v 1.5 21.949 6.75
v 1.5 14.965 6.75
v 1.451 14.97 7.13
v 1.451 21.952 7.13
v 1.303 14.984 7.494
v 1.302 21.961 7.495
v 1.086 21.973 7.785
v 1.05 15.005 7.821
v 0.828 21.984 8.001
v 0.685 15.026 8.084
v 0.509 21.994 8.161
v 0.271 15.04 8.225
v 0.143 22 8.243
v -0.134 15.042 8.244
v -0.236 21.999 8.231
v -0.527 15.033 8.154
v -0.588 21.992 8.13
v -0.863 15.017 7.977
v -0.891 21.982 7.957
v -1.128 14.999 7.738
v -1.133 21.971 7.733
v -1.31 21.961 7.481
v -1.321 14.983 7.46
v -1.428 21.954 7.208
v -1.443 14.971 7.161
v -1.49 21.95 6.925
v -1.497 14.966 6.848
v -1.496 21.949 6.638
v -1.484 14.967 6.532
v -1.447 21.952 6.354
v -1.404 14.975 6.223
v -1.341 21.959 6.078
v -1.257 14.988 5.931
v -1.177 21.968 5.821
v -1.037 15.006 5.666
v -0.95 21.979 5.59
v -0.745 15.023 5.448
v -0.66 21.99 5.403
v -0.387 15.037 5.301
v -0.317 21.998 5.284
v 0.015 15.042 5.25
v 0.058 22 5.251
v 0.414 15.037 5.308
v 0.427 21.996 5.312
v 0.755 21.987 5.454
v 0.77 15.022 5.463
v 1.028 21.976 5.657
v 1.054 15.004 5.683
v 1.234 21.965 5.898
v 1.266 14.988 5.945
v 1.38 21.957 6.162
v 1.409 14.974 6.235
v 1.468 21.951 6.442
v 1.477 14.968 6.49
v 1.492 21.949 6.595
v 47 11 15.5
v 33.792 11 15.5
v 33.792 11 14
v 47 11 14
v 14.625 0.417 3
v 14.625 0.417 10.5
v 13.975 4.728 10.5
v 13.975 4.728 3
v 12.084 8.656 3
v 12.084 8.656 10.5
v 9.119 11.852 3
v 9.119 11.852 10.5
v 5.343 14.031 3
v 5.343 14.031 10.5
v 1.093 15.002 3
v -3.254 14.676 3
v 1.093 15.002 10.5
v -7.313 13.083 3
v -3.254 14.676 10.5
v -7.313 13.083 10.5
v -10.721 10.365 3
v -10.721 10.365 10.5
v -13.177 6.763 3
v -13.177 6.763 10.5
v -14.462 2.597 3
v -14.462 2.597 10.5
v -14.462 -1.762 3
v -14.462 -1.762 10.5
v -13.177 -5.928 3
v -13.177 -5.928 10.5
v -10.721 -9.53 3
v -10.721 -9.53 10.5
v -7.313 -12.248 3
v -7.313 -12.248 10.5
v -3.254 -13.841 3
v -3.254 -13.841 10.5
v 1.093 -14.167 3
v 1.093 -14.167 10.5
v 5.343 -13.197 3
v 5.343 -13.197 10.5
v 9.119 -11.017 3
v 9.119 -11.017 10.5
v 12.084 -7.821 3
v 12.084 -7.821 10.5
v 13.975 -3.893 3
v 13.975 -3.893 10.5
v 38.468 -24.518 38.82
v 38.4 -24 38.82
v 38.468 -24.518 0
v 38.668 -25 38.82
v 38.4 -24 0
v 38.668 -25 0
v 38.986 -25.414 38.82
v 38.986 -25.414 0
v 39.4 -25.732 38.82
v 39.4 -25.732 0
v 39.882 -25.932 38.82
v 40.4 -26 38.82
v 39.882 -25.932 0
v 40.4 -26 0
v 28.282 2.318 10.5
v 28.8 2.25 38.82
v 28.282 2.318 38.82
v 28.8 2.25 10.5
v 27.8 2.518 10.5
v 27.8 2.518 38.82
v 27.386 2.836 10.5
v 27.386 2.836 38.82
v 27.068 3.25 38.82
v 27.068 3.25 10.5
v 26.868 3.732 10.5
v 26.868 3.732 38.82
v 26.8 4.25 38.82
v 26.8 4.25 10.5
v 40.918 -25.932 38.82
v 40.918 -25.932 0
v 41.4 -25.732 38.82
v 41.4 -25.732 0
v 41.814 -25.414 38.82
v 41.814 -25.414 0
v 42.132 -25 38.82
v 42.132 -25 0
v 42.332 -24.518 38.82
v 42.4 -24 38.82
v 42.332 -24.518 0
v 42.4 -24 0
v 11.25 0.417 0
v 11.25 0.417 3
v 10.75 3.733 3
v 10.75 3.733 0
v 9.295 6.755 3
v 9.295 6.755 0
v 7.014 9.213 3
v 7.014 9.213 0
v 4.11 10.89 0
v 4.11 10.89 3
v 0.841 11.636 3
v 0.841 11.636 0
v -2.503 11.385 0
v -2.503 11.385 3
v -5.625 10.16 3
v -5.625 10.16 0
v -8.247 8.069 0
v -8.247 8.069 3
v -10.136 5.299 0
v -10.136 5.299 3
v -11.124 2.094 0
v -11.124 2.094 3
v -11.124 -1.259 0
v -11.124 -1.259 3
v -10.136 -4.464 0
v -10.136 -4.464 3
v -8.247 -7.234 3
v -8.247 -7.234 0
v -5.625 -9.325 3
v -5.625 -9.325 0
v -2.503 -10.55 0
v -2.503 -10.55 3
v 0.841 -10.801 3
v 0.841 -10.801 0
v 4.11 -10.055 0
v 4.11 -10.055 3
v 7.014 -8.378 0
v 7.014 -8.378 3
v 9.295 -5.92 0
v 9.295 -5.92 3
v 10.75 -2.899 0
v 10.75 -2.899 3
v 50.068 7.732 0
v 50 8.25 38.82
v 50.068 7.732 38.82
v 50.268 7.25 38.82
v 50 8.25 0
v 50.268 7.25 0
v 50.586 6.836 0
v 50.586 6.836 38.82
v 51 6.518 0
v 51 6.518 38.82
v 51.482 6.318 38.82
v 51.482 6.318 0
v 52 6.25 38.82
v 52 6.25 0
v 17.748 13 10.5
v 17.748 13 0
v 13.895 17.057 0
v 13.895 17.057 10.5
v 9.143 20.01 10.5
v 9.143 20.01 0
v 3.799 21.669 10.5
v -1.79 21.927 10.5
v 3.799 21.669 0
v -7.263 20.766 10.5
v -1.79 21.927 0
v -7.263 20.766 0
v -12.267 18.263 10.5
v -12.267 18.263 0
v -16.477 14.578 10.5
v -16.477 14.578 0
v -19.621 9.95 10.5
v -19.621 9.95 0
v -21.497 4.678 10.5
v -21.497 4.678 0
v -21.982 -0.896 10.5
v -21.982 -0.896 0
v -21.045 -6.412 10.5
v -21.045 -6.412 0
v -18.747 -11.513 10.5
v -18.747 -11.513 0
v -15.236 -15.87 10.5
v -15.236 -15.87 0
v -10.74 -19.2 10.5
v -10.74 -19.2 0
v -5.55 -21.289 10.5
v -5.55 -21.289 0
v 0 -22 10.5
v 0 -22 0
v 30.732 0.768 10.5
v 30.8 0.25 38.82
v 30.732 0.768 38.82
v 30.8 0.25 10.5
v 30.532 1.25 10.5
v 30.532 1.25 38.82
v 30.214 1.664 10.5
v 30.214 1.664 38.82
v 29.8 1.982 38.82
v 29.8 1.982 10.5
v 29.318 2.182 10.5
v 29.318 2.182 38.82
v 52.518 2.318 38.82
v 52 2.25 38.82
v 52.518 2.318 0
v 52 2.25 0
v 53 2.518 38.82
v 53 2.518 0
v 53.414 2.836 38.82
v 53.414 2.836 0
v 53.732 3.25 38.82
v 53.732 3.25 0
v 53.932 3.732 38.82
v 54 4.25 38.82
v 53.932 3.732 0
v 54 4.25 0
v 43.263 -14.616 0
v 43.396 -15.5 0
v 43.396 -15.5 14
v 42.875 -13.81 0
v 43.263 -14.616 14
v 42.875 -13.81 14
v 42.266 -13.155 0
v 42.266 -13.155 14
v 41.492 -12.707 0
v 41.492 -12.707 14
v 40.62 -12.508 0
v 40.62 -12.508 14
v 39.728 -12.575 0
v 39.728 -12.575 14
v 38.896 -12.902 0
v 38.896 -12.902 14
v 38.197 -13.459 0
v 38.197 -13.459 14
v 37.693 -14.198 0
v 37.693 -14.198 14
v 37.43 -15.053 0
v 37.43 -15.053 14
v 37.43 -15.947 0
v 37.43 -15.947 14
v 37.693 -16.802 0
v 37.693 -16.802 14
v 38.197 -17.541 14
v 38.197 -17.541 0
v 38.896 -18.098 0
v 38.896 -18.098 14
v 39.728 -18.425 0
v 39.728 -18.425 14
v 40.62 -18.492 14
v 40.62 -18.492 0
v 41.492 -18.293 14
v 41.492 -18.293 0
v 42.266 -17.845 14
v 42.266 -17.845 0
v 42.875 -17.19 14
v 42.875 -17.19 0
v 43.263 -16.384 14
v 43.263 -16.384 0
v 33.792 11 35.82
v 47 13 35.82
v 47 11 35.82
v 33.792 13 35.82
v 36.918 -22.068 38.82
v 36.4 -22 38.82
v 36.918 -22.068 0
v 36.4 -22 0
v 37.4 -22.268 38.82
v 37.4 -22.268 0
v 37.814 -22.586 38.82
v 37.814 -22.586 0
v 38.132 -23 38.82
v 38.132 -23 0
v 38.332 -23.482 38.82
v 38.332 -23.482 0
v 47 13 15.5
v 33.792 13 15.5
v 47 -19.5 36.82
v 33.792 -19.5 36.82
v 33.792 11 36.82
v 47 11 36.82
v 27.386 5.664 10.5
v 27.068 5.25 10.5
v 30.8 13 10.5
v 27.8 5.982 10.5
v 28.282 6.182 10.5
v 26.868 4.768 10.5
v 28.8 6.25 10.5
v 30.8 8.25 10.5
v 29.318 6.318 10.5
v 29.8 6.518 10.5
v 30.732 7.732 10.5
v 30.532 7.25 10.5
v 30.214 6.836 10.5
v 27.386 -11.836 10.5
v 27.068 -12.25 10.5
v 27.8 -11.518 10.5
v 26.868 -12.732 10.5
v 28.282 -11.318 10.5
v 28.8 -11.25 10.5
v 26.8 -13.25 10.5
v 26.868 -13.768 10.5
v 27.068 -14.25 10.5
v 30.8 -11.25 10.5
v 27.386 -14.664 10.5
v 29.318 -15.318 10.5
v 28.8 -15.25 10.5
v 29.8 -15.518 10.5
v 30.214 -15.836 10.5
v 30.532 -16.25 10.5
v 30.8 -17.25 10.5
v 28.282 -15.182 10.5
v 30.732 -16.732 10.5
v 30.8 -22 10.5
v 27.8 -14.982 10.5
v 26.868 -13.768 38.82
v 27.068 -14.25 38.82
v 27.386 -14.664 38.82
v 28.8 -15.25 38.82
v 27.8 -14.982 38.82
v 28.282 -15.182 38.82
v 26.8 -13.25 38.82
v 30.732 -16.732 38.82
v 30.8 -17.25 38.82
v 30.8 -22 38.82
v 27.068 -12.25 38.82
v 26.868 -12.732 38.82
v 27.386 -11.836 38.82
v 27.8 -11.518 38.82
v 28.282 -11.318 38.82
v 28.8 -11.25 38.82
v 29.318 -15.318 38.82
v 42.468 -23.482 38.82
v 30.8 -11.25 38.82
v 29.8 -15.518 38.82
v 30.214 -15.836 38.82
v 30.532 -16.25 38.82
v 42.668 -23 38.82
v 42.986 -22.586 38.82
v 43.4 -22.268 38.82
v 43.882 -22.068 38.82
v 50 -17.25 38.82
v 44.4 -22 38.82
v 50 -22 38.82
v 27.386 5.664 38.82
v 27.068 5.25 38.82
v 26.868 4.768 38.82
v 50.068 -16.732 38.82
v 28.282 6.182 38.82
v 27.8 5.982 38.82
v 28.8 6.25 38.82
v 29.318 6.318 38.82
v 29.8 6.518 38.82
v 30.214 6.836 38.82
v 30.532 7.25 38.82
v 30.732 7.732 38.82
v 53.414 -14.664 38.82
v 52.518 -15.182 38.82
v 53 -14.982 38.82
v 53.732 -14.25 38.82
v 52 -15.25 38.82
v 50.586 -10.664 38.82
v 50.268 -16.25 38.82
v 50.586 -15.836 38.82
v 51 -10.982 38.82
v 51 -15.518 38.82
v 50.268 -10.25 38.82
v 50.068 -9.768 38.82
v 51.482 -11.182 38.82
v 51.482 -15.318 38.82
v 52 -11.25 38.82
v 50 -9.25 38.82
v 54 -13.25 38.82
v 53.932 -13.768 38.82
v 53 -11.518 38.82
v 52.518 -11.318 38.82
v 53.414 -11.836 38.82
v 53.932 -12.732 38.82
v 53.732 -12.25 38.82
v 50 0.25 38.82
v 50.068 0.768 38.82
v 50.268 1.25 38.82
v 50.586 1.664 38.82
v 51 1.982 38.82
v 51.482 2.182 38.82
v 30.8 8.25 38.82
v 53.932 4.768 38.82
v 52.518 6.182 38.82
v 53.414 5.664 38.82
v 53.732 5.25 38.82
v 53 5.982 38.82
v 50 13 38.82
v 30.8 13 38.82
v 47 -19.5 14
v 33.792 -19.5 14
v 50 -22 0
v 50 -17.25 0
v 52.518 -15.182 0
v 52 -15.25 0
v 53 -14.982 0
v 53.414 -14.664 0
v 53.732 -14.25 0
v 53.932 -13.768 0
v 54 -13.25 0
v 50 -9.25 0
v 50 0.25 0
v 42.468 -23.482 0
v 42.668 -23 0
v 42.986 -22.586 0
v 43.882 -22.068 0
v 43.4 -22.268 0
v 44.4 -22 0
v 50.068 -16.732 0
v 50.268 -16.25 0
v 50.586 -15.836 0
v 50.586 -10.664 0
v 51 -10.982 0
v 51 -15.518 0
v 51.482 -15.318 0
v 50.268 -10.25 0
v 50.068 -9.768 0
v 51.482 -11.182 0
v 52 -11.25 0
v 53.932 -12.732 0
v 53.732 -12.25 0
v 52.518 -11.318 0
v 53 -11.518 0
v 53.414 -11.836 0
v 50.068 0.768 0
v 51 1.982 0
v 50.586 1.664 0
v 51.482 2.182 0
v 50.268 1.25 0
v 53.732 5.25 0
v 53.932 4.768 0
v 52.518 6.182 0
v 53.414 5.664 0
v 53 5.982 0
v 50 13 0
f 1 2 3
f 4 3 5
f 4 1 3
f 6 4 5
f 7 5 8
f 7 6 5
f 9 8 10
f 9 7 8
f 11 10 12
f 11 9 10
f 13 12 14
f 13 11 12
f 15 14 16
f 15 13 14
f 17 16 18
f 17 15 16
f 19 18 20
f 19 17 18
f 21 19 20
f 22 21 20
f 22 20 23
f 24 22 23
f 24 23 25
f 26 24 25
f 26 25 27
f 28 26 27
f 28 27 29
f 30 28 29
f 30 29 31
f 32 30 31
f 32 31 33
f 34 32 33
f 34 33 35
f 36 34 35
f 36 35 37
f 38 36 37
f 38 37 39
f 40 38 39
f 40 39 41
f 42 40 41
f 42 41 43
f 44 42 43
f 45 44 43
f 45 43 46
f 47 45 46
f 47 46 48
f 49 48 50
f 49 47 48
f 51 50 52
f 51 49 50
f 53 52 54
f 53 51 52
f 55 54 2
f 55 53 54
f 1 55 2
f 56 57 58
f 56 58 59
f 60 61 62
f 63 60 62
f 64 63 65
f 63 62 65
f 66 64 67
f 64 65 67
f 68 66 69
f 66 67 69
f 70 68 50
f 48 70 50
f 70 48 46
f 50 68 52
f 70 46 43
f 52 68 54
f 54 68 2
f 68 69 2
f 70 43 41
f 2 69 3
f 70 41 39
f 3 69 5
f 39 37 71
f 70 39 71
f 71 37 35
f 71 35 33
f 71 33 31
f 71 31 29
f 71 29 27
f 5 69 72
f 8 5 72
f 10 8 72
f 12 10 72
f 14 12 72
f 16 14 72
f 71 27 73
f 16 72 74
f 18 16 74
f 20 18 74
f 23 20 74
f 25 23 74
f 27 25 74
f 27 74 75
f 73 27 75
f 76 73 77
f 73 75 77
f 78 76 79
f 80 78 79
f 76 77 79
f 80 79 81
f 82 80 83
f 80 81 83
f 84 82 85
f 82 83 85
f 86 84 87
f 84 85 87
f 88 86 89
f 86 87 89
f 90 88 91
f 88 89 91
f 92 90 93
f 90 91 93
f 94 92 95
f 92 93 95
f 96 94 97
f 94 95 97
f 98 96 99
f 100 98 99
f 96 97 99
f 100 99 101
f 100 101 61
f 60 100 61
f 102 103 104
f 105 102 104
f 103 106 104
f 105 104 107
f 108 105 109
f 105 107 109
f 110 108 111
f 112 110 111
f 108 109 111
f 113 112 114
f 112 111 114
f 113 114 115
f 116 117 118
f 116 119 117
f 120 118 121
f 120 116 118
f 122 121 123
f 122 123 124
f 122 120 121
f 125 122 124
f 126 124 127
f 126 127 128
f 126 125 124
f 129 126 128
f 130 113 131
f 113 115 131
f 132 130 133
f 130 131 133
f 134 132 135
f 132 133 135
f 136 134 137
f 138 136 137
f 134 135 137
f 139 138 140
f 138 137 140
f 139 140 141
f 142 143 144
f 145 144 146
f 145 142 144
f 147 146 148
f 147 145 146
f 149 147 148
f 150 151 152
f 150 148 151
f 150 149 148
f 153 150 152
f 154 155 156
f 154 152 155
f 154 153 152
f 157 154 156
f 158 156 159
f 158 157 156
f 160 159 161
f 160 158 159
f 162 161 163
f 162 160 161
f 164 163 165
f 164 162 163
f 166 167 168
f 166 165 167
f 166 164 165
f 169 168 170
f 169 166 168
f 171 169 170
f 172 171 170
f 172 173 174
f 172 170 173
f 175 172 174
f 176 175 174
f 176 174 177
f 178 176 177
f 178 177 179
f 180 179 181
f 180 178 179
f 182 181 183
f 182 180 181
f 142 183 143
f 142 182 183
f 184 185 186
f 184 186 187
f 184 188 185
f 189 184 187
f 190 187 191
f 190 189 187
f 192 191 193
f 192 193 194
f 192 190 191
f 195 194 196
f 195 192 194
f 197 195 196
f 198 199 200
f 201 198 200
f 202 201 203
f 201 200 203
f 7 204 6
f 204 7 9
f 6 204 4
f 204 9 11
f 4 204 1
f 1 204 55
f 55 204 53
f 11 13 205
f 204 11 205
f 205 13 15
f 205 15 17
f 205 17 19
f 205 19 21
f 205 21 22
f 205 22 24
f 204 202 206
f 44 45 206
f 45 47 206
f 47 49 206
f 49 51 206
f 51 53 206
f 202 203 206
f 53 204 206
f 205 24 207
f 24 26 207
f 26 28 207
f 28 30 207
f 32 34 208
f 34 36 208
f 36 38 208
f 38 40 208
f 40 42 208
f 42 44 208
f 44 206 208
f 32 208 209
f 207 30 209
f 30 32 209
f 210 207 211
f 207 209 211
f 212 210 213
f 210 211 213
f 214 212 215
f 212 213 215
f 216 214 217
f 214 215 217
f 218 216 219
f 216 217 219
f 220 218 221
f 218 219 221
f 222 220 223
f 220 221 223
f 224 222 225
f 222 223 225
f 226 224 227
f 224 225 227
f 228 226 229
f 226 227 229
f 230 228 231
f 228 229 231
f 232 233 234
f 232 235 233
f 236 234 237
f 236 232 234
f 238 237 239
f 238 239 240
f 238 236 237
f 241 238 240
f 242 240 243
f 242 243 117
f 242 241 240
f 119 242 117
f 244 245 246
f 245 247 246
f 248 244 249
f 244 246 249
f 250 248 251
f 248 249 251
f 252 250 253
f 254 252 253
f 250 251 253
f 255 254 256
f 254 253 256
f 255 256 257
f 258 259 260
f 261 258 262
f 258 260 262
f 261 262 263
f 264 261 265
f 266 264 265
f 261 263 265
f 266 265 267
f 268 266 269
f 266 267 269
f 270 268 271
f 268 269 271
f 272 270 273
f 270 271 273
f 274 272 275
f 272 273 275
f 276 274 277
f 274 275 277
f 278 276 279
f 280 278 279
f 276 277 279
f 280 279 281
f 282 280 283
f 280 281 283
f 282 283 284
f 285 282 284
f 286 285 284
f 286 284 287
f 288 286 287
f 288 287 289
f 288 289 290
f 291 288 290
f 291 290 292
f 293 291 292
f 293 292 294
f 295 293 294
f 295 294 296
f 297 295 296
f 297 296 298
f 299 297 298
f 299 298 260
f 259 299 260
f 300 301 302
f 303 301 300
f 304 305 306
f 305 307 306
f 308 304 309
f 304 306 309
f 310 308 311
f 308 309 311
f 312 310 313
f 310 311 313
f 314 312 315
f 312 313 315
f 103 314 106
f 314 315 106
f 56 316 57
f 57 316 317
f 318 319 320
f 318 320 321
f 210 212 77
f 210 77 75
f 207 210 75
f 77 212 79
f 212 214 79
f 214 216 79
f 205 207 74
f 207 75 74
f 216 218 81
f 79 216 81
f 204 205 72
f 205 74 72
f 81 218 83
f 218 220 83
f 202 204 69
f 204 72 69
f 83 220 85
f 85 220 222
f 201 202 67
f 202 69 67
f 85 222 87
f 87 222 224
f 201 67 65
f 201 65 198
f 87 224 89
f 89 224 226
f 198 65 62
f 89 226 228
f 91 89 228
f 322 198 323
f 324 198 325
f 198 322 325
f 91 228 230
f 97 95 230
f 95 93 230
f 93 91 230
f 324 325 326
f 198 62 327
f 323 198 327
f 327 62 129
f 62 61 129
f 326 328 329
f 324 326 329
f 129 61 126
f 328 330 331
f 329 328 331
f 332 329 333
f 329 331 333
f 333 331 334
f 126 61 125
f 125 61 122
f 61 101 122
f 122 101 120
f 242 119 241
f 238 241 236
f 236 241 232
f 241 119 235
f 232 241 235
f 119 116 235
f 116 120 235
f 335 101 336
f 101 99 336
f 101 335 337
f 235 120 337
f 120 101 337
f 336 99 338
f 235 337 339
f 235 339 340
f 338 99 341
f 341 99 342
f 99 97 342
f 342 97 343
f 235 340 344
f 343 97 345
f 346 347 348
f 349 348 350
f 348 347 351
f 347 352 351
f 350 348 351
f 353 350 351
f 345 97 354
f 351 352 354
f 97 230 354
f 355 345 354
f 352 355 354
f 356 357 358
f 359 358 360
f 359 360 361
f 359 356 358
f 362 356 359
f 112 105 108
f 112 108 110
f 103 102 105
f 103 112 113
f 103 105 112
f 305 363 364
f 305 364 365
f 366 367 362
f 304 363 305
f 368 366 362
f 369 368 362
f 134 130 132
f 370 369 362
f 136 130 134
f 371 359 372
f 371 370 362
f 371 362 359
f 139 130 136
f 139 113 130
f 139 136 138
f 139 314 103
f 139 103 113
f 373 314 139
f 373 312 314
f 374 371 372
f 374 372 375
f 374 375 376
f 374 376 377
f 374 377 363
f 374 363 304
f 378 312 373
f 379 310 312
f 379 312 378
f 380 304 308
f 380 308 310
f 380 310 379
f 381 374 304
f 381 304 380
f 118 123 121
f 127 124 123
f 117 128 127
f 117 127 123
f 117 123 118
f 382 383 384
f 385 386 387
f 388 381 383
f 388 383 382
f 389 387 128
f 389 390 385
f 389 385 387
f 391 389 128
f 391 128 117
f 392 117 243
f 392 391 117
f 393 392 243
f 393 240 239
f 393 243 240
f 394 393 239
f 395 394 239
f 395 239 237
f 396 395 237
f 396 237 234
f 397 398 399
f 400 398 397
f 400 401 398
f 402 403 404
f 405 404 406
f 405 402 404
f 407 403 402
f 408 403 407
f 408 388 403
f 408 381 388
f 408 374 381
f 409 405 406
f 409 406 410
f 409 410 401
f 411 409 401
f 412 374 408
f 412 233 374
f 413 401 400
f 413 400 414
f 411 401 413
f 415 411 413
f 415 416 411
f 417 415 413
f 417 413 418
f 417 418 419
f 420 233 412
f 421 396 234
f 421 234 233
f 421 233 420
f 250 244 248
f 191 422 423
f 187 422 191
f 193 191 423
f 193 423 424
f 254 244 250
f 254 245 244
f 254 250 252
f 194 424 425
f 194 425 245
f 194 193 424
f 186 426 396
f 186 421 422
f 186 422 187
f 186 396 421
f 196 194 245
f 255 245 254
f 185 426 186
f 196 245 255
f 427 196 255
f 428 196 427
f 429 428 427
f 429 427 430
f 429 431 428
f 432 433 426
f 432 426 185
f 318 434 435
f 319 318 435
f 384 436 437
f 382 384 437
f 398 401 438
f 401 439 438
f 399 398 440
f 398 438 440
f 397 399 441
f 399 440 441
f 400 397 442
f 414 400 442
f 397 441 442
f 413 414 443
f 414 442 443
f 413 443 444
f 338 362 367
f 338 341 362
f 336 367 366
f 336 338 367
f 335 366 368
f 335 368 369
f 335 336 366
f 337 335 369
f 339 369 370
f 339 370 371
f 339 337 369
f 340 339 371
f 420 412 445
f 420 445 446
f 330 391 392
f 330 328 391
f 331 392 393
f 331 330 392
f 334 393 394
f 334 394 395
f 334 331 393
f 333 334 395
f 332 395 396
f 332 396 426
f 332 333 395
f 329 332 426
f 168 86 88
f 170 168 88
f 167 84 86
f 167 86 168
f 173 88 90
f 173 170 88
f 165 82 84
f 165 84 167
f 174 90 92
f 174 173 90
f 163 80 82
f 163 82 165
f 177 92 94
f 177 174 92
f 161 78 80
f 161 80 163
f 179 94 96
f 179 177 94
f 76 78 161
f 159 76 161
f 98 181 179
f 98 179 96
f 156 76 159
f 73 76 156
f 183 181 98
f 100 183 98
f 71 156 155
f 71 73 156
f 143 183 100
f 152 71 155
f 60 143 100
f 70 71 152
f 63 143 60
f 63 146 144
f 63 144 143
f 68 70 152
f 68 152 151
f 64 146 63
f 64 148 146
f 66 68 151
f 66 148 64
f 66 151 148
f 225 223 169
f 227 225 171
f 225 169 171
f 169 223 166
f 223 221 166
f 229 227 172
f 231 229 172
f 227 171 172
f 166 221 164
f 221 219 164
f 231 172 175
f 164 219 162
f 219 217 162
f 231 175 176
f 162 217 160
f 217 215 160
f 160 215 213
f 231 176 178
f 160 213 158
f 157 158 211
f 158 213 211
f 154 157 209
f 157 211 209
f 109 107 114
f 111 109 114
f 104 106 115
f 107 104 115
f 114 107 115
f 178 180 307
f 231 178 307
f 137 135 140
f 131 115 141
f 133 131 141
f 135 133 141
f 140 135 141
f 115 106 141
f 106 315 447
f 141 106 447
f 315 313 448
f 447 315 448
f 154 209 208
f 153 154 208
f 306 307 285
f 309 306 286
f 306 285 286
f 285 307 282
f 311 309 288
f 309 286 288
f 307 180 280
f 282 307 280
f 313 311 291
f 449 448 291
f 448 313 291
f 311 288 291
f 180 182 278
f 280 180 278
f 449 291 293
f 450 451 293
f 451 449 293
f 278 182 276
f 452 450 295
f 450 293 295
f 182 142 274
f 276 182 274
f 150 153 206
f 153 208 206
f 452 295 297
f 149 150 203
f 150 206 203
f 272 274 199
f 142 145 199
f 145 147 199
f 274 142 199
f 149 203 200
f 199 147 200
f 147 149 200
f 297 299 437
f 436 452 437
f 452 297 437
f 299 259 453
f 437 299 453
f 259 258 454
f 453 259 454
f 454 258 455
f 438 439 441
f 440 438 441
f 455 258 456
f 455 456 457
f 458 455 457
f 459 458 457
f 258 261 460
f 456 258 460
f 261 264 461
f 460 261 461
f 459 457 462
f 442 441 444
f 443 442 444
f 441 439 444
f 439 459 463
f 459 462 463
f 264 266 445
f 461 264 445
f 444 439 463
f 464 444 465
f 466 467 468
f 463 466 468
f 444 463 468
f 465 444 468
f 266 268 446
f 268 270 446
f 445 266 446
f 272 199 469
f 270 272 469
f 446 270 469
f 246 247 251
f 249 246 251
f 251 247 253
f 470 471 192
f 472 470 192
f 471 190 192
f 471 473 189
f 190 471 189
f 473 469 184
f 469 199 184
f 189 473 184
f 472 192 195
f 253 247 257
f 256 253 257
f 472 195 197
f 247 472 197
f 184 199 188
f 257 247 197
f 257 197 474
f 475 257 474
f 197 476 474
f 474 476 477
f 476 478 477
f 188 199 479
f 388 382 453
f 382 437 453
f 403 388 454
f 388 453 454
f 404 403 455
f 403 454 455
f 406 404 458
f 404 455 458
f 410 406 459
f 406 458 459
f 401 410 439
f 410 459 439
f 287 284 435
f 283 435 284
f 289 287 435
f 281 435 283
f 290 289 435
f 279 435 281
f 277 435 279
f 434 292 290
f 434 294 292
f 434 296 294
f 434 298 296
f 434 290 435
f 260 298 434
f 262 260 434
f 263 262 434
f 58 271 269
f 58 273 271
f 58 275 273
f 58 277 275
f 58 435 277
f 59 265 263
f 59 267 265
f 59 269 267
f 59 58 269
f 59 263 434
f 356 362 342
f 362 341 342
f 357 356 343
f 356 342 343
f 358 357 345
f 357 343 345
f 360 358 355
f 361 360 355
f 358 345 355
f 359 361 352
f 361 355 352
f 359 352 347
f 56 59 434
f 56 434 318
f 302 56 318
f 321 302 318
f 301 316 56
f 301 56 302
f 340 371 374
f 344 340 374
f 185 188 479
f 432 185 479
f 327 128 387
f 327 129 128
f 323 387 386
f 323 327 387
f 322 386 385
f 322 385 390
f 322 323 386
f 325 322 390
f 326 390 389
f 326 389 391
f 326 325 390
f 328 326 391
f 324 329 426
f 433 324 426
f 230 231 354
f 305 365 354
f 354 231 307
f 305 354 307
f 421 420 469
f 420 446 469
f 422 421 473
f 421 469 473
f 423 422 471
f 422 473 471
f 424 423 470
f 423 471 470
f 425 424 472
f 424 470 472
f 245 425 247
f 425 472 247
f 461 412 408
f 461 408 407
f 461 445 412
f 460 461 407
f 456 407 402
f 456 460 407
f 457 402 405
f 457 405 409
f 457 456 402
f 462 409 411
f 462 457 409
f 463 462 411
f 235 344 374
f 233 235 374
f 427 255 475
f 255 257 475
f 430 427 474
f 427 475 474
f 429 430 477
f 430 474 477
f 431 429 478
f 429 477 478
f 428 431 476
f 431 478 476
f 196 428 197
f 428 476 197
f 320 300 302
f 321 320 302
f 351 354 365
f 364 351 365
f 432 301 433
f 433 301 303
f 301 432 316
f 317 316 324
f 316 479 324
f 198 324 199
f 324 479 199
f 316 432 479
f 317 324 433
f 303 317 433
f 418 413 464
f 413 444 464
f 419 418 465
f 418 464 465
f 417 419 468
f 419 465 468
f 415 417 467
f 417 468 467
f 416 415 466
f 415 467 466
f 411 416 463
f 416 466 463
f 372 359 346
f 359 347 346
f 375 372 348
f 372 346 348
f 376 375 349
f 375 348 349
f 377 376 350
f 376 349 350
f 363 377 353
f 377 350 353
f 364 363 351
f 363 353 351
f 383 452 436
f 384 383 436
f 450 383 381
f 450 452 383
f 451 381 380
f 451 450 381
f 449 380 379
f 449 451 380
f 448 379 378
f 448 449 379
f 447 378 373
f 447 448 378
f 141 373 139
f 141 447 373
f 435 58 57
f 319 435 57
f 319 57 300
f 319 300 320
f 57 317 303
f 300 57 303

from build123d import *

# Parameters (mm, degrees)
F0_R      = 22
F0_R_2    = 11.25
F1_DEPTH  = 10.5
F3_DEPTH  = 38.82
F4_R      = 14.625
F4_R_2    = 11.125
F5_DEPTH  = 7.5
F8_W      = 13.208
F8_H      = 20.32
F9_DEPTH  = 32.5
F10_R     = 3
F11_DEPTH = 15.4999664724
F12_W     = 13.208
F12_H     = 30.5
F13_DEPTH = 1.5
F14_W     = 13.208
F14_H     = 30.5
F15_DEPTH = 1
F16_W     = 30.8
F16_H     = 28.32
F17_DEPTH = 44.001
F18_W     = 4
F18_H     = 4
F19_DEPTH = 38.82
F20_R     = 1.99999
F7_R      = 1.5
F21_DEPTH = 10


# Not quite as in the source:
# - a fillet or chamfer is up to 0.001 mm smaller than in the source, because OpenCascade refuses the exact size
# - a feature names something its author has since deleted; it is built from what else it names


with BuildPart() as f1:
    # F0 (on Top) → F1 (new body)
    with BuildSketch(Plane.XY):
        Circle(F0_R)
        with Locations((-1.609e-06, 0.4174434871)):
            Circle(F0_R_2, mode=Mode.SUBTRACT)
    extrude(amount=F1_DEPTH)

    # F2 (on Top) → F3 (join)
    with BuildSketch(Plane.XY):
        with BuildLine():
            Line((0, -22), (50, -22))
            Line((50, -22), (50, 13))
            Line((50, 13), (17.7482393493, 13))
            ThreePointArc((17.7482393493, 13), (19.6214168703, -9.9498743711), (0, -22))
        make_face()
    extrude(amount=F3_DEPTH)

    # F4 (on face) → F5 (cut)
    with BuildSketch(Plane.XY.offset(10.5)):
        with Locations((-1.609e-06, 0.4174434871)):
            Circle(F4_R)
        with Locations((-1.609e-06, 0.4174434871)):
            Circle(F4_R_2, mode=Mode.SUBTRACT)
    extrude(amount=-F5_DEPTH, mode=Mode.SUBTRACT)

    # F8 (on face) → F9 (cut)
    with BuildSketch(Plane(origin=(0, 13, 0), x_dir=(-1, 0, 0), z_dir=(0, 1, 0))):
        with Locations((-40.396, 25.6599664724)):
            Rectangle(F8_W, F8_H)
    extrude(amount=-F9_DEPTH, mode=Mode.SUBTRACT)

    # F10 (on face) → F11 (cut, through all)
    with BuildSketch(Plane.XY.offset(15.4999664724)):
        with Locations((40.396, -15.5)):
            Circle(F10_R)
    extrude(amount=-F11_DEPTH, mode=Mode.SUBTRACT)

    # F12 (on face) → F13 (cut)
    with BuildSketch(Plane.XY.offset(15.4999664724)):
        with Locations((40.396, -4.25)):
            Rectangle(F12_W, F12_H)
    extrude(amount=-F13_DEPTH, mode=Mode.SUBTRACT)

    # F14 (on face) → F15 (cut)
    with BuildSketch(Plane(origin=(0, 0, 35.8199664724), x_dir=(1, 0, 0), z_dir=(0, 0, -1))):
        with Locations((40.396, 4.25)):
            Rectangle(F14_W, F14_H)
    extrude(amount=-F15_DEPTH, mode=Mode.SUBTRACT)

    # F16 (on face) → F17 (cut, through all)
    with BuildSketch(Plane.XZ.offset(22)):
        with Locations((15.4, 24.66)):
            Rectangle(F16_W, F16_H)
    extrude(amount=-F17_DEPTH, mode=Mode.SUBTRACT)

    # F18 (on face) → F19 (join, through all)
    with BuildSketch(Plane.XY.offset(38.82)):
        with Locations((52, 4.25)):
            Rectangle(F18_W, F18_H)
        with Locations((52, -13.25)):
            Rectangle(F18_W, F18_H)
        with Locations((28.8, -13.25)):
            Rectangle(F18_W, F18_H)
        with Locations((28.8, 4.25)):
            Rectangle(F18_W, F18_H)
        Polygon((40.4, -22), (38.4, -22), (38.4, -26), (42.4, -26), (42.4, -22), align=None)
    extrude(amount=-F19_DEPTH)

    # F20 (radius 2 in the source; OpenCascade refuses exactly that, so slightly less here)
    f20_edges = [f1.edges().sort_by_distance(p)[0] for p in [
        (42.4, -26, 19.41),
        (38.4, -26, 19.41),
        (42.4, -22, 19.41),
        (50, -15.25, 19.41),
        (54, -15.25, 19.41),
        (54, -11.25, 19.41),
        (50, 2.25, 19.41),
        (54, 2.25, 19.41),
        (54, 6.25, 19.41),
        (26.8, 2.25, 24.66),
        (26.8, -15.25, 24.66),
        (50, -11.25, 19.41),
        (50, 6.25, 19.41),
        (38.4, -22, 19.41),
        (26.8, -11.25, 24.66),
        (26.8, 6.25, 24.66),
        (30.8, 6.25, 24.66),
        (30.8, 2.25, 24.66),
        (30.8, -15.25, 24.66),
    ]]
    fillet(f20_edges, radius=F20_R)

    # F7 (on offset) → F21 (cut)
    with BuildSketch(Plane.XZ.offset(-22)):
        with Locations((0, 6.75)):
            Circle(F7_R)
    extrude(amount=F21_DEPTH, mode=Mode.SUBTRACT)


solid = f1.part
